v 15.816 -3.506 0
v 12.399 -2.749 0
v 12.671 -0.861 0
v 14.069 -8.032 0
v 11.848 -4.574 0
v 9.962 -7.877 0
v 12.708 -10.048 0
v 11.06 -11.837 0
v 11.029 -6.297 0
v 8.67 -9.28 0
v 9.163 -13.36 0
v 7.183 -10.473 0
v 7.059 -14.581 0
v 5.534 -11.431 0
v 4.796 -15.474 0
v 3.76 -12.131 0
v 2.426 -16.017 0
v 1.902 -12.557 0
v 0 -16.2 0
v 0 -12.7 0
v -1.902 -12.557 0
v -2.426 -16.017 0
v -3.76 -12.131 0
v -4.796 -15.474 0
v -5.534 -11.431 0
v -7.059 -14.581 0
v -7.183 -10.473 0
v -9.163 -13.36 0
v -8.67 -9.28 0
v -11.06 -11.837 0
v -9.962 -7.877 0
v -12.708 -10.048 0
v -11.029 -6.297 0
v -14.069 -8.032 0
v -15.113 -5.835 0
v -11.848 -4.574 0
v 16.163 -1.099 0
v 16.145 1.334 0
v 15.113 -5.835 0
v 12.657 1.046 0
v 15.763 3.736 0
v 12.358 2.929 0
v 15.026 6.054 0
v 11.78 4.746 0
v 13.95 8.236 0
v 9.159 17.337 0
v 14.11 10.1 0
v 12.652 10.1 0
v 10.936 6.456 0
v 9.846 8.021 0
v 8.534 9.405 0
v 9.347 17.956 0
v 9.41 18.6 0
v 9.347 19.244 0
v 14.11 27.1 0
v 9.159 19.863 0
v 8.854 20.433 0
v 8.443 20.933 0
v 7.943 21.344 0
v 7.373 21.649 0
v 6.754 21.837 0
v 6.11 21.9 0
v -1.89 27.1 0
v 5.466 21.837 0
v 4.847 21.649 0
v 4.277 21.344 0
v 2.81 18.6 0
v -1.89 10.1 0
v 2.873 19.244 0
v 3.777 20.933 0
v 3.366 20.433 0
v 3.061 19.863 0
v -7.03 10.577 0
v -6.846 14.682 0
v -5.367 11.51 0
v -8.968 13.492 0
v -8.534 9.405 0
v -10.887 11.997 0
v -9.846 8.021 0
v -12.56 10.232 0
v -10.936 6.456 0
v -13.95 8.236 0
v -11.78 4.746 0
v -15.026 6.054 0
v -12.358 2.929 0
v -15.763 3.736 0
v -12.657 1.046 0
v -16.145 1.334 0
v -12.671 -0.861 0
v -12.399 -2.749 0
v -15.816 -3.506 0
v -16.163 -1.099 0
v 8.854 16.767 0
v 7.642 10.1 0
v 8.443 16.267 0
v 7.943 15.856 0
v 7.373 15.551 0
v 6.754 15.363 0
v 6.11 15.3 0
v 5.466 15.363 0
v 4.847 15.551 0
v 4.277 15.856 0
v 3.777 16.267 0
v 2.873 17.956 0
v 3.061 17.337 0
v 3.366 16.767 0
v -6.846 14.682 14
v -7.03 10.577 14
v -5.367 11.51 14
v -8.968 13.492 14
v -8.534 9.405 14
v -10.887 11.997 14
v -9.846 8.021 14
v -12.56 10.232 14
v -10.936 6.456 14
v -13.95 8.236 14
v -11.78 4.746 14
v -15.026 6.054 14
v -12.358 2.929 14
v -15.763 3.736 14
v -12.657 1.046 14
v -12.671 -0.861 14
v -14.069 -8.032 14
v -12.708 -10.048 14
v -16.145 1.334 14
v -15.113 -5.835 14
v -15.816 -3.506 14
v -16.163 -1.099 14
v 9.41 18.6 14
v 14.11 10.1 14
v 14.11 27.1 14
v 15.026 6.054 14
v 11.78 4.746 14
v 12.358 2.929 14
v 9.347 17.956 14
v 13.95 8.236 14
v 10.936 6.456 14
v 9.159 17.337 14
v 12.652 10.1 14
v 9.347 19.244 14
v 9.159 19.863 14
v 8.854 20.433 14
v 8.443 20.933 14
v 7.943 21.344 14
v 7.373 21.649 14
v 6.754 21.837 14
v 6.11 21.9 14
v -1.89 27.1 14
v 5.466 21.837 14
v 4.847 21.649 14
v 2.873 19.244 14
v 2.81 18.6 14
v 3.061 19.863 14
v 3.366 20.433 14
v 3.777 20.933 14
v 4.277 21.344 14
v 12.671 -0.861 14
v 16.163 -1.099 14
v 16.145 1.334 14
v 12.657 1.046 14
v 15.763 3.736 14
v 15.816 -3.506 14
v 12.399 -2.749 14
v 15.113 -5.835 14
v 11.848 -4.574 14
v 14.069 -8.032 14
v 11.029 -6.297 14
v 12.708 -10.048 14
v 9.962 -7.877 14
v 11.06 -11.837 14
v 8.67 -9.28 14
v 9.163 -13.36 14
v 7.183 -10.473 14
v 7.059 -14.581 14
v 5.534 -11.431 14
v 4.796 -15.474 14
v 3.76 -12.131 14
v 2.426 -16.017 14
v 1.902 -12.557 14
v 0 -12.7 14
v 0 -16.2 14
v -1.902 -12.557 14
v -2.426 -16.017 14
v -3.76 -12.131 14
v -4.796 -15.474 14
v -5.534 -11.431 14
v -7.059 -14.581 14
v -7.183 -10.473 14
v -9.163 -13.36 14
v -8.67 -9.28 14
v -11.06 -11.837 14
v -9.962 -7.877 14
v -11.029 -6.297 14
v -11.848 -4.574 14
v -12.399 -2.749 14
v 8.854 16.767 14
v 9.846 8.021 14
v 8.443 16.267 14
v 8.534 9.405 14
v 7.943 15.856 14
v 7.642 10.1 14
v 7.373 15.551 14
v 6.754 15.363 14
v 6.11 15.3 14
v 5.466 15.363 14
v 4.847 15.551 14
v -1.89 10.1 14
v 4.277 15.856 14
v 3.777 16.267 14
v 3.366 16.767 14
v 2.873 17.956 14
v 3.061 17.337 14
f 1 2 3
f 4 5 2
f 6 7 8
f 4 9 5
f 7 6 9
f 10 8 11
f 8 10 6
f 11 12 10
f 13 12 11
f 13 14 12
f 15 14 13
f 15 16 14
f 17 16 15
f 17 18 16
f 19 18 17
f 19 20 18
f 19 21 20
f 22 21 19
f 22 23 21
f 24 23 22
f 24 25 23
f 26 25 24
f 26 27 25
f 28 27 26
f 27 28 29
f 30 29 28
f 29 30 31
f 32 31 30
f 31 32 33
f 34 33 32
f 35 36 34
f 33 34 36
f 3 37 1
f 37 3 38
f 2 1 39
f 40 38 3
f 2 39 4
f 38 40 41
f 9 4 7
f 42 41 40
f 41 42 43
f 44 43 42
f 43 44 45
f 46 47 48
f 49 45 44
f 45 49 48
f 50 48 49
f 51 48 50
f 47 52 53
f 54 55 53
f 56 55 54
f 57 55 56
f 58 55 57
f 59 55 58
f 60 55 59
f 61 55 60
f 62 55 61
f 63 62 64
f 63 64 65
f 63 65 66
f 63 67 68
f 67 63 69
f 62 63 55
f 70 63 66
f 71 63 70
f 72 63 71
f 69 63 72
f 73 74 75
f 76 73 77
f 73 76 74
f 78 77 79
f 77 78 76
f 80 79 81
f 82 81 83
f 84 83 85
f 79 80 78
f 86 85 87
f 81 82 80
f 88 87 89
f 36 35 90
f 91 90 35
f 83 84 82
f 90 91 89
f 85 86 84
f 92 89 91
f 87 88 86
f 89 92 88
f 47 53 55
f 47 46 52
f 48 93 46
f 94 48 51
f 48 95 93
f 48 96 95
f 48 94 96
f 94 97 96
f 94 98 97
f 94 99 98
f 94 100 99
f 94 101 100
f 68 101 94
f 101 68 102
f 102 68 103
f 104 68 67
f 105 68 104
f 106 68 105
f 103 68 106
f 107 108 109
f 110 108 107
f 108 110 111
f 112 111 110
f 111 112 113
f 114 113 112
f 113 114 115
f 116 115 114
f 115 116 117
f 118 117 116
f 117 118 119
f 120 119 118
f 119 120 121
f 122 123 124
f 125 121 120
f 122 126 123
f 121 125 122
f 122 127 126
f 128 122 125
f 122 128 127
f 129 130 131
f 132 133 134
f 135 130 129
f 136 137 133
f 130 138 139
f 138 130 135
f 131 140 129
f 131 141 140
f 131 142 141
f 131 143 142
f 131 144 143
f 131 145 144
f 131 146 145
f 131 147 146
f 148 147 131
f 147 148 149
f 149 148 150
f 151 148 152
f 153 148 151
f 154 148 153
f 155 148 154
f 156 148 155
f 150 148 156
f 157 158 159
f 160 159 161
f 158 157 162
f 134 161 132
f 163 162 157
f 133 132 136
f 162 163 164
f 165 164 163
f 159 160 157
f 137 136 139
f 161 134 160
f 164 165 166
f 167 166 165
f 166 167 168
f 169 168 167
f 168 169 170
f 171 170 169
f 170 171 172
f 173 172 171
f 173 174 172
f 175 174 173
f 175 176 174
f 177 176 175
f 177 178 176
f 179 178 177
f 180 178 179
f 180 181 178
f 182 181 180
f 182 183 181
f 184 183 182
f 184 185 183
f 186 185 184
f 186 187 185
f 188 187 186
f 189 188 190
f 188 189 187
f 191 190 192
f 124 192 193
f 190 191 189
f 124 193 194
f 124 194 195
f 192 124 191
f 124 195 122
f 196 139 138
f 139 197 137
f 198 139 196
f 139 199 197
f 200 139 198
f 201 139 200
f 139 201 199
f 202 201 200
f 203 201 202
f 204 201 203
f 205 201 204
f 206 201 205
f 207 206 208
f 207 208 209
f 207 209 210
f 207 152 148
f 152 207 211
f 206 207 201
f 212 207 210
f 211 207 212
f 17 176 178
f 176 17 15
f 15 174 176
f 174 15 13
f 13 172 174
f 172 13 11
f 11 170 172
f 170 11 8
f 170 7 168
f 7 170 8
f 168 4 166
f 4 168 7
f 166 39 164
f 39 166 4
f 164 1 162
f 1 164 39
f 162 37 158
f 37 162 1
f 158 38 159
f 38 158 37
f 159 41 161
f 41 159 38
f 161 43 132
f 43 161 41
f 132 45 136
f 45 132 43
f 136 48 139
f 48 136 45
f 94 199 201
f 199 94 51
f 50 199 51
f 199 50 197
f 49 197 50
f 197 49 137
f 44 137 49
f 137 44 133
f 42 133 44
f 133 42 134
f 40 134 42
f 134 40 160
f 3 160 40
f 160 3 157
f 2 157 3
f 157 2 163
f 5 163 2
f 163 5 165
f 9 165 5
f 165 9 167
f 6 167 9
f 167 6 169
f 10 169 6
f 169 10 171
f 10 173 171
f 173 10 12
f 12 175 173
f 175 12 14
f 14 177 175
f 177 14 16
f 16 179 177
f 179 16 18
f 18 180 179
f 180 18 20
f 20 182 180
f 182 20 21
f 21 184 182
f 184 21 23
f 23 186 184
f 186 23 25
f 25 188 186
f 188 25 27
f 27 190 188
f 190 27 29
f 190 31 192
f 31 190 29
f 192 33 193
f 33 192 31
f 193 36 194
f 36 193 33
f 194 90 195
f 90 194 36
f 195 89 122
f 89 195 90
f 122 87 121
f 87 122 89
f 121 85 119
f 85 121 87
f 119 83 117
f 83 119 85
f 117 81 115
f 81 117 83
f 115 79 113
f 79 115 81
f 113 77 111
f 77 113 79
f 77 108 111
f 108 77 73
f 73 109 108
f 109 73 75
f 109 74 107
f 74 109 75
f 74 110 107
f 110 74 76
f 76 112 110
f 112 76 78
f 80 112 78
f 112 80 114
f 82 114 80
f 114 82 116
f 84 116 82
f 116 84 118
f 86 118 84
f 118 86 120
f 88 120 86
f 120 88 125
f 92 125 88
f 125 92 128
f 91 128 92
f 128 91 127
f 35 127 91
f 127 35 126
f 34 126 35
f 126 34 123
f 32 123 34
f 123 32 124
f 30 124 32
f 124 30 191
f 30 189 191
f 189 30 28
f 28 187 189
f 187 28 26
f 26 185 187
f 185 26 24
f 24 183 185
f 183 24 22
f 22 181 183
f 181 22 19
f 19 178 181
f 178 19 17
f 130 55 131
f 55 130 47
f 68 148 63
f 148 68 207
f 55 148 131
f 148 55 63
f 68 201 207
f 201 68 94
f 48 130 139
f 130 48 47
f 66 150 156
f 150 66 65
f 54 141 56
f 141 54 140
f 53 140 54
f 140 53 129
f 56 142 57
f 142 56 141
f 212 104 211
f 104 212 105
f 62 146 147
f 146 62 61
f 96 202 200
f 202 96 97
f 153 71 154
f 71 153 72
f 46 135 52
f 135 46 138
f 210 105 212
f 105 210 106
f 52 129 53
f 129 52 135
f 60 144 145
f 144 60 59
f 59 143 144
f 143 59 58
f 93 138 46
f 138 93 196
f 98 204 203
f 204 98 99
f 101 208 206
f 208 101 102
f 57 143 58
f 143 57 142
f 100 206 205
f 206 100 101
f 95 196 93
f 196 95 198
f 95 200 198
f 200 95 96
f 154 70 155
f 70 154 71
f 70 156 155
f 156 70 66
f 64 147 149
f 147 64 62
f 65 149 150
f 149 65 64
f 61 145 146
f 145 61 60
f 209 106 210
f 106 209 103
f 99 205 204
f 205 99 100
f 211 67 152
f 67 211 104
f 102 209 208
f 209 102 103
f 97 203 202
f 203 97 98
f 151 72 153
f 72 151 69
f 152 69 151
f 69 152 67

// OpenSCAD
$fn = 32;

// ----------------------------------------------------------------------
// Pipe clamp: 32.4 mm ring, 3.5 mm wall, 14 mm wide
// ----------------------------------------------------------------------

// --- parameters (mm) ---
outer_r = 16.2;           // clamp outside radius
inner_r = 12.7;           // pipe bore radius
band = 3.5;               // band thickness
clamp_w = 14;             // clamp width
opening = 50;             // opening angle between the ends
lug_w = 16;               // lug width
lug_len = 17;             // lug length
bolt_d = 6.6;             // bolt hole

clamp_profile = [[-6.846, 14.682], [-8.968, 13.492], [-10.887, 11.997], [-12.56, 10.232], [-13.95, 8.236], [-15.026, 6.054], [-15.763, 3.736], [-16.145, 1.334], [-16.163, -1.099], [-15.816, -3.506], [-15.113, -5.835], [-14.069, -8.032], [-12.708, -10.048], [-11.06, -11.837], [-9.163, -13.36], [-7.059, -14.581], [-4.796, -15.474], [-2.426, -16.017], [0, -16.2], [2.426, -16.017], [4.796, -15.474], [7.059, -14.581], [9.163, -13.36], [11.06, -11.837], [12.708, -10.048], [14.069, -8.032], [15.113, -5.835], [15.816, -3.506], [16.163, -1.099], [16.145, 1.334], [15.763, 3.736], [15.026, 6.054], [13.95, 8.236], [12.56, 10.232], [10.887, 11.997], [8.968, 13.492], [6.846, 14.682], [5.367, 11.51], [7.03, 10.577], [8.534, 9.405], [9.846, 8.021], [10.936, 6.456], [11.78, 4.746], [12.358, 2.929], [12.657, 1.046], [12.671, -0.861], [12.399, -2.749], [11.848, -4.574], [11.029, -6.297], [9.962, -7.877], [8.67, -9.28], [7.183, -10.473], [5.534, -11.431], [3.76, -12.131], [1.902, -12.557], [0, -12.7], [-1.902, -12.557], [-3.76, -12.131], [-5.534, -11.431], [-7.183, -10.473], [-8.67, -9.28], [-9.962, -7.877], [-11.029, -6.297], [-11.848, -4.574], [-12.399, -2.749], [-12.671, -0.861], [-12.657, 1.046], [-12.358, 2.929], [-11.78, 4.746], [-10.936, 6.456], [-9.846, 8.021], [-8.534, 9.405], [-7.03, 10.577], [-5.367, 11.51]];

difference() {
  union() {
    linear_extrude(height = clamp_w) polygon(clamp_profile);
    /* bolt lug on the other end */
    translate([-1.89, 10.1, 0]) cube([lug_w, 17, clamp_w]);
  }
  translate([6.11, 18.6, -2.5]) cylinder(h = clamp_w + 5, d = bolt_d);
}
